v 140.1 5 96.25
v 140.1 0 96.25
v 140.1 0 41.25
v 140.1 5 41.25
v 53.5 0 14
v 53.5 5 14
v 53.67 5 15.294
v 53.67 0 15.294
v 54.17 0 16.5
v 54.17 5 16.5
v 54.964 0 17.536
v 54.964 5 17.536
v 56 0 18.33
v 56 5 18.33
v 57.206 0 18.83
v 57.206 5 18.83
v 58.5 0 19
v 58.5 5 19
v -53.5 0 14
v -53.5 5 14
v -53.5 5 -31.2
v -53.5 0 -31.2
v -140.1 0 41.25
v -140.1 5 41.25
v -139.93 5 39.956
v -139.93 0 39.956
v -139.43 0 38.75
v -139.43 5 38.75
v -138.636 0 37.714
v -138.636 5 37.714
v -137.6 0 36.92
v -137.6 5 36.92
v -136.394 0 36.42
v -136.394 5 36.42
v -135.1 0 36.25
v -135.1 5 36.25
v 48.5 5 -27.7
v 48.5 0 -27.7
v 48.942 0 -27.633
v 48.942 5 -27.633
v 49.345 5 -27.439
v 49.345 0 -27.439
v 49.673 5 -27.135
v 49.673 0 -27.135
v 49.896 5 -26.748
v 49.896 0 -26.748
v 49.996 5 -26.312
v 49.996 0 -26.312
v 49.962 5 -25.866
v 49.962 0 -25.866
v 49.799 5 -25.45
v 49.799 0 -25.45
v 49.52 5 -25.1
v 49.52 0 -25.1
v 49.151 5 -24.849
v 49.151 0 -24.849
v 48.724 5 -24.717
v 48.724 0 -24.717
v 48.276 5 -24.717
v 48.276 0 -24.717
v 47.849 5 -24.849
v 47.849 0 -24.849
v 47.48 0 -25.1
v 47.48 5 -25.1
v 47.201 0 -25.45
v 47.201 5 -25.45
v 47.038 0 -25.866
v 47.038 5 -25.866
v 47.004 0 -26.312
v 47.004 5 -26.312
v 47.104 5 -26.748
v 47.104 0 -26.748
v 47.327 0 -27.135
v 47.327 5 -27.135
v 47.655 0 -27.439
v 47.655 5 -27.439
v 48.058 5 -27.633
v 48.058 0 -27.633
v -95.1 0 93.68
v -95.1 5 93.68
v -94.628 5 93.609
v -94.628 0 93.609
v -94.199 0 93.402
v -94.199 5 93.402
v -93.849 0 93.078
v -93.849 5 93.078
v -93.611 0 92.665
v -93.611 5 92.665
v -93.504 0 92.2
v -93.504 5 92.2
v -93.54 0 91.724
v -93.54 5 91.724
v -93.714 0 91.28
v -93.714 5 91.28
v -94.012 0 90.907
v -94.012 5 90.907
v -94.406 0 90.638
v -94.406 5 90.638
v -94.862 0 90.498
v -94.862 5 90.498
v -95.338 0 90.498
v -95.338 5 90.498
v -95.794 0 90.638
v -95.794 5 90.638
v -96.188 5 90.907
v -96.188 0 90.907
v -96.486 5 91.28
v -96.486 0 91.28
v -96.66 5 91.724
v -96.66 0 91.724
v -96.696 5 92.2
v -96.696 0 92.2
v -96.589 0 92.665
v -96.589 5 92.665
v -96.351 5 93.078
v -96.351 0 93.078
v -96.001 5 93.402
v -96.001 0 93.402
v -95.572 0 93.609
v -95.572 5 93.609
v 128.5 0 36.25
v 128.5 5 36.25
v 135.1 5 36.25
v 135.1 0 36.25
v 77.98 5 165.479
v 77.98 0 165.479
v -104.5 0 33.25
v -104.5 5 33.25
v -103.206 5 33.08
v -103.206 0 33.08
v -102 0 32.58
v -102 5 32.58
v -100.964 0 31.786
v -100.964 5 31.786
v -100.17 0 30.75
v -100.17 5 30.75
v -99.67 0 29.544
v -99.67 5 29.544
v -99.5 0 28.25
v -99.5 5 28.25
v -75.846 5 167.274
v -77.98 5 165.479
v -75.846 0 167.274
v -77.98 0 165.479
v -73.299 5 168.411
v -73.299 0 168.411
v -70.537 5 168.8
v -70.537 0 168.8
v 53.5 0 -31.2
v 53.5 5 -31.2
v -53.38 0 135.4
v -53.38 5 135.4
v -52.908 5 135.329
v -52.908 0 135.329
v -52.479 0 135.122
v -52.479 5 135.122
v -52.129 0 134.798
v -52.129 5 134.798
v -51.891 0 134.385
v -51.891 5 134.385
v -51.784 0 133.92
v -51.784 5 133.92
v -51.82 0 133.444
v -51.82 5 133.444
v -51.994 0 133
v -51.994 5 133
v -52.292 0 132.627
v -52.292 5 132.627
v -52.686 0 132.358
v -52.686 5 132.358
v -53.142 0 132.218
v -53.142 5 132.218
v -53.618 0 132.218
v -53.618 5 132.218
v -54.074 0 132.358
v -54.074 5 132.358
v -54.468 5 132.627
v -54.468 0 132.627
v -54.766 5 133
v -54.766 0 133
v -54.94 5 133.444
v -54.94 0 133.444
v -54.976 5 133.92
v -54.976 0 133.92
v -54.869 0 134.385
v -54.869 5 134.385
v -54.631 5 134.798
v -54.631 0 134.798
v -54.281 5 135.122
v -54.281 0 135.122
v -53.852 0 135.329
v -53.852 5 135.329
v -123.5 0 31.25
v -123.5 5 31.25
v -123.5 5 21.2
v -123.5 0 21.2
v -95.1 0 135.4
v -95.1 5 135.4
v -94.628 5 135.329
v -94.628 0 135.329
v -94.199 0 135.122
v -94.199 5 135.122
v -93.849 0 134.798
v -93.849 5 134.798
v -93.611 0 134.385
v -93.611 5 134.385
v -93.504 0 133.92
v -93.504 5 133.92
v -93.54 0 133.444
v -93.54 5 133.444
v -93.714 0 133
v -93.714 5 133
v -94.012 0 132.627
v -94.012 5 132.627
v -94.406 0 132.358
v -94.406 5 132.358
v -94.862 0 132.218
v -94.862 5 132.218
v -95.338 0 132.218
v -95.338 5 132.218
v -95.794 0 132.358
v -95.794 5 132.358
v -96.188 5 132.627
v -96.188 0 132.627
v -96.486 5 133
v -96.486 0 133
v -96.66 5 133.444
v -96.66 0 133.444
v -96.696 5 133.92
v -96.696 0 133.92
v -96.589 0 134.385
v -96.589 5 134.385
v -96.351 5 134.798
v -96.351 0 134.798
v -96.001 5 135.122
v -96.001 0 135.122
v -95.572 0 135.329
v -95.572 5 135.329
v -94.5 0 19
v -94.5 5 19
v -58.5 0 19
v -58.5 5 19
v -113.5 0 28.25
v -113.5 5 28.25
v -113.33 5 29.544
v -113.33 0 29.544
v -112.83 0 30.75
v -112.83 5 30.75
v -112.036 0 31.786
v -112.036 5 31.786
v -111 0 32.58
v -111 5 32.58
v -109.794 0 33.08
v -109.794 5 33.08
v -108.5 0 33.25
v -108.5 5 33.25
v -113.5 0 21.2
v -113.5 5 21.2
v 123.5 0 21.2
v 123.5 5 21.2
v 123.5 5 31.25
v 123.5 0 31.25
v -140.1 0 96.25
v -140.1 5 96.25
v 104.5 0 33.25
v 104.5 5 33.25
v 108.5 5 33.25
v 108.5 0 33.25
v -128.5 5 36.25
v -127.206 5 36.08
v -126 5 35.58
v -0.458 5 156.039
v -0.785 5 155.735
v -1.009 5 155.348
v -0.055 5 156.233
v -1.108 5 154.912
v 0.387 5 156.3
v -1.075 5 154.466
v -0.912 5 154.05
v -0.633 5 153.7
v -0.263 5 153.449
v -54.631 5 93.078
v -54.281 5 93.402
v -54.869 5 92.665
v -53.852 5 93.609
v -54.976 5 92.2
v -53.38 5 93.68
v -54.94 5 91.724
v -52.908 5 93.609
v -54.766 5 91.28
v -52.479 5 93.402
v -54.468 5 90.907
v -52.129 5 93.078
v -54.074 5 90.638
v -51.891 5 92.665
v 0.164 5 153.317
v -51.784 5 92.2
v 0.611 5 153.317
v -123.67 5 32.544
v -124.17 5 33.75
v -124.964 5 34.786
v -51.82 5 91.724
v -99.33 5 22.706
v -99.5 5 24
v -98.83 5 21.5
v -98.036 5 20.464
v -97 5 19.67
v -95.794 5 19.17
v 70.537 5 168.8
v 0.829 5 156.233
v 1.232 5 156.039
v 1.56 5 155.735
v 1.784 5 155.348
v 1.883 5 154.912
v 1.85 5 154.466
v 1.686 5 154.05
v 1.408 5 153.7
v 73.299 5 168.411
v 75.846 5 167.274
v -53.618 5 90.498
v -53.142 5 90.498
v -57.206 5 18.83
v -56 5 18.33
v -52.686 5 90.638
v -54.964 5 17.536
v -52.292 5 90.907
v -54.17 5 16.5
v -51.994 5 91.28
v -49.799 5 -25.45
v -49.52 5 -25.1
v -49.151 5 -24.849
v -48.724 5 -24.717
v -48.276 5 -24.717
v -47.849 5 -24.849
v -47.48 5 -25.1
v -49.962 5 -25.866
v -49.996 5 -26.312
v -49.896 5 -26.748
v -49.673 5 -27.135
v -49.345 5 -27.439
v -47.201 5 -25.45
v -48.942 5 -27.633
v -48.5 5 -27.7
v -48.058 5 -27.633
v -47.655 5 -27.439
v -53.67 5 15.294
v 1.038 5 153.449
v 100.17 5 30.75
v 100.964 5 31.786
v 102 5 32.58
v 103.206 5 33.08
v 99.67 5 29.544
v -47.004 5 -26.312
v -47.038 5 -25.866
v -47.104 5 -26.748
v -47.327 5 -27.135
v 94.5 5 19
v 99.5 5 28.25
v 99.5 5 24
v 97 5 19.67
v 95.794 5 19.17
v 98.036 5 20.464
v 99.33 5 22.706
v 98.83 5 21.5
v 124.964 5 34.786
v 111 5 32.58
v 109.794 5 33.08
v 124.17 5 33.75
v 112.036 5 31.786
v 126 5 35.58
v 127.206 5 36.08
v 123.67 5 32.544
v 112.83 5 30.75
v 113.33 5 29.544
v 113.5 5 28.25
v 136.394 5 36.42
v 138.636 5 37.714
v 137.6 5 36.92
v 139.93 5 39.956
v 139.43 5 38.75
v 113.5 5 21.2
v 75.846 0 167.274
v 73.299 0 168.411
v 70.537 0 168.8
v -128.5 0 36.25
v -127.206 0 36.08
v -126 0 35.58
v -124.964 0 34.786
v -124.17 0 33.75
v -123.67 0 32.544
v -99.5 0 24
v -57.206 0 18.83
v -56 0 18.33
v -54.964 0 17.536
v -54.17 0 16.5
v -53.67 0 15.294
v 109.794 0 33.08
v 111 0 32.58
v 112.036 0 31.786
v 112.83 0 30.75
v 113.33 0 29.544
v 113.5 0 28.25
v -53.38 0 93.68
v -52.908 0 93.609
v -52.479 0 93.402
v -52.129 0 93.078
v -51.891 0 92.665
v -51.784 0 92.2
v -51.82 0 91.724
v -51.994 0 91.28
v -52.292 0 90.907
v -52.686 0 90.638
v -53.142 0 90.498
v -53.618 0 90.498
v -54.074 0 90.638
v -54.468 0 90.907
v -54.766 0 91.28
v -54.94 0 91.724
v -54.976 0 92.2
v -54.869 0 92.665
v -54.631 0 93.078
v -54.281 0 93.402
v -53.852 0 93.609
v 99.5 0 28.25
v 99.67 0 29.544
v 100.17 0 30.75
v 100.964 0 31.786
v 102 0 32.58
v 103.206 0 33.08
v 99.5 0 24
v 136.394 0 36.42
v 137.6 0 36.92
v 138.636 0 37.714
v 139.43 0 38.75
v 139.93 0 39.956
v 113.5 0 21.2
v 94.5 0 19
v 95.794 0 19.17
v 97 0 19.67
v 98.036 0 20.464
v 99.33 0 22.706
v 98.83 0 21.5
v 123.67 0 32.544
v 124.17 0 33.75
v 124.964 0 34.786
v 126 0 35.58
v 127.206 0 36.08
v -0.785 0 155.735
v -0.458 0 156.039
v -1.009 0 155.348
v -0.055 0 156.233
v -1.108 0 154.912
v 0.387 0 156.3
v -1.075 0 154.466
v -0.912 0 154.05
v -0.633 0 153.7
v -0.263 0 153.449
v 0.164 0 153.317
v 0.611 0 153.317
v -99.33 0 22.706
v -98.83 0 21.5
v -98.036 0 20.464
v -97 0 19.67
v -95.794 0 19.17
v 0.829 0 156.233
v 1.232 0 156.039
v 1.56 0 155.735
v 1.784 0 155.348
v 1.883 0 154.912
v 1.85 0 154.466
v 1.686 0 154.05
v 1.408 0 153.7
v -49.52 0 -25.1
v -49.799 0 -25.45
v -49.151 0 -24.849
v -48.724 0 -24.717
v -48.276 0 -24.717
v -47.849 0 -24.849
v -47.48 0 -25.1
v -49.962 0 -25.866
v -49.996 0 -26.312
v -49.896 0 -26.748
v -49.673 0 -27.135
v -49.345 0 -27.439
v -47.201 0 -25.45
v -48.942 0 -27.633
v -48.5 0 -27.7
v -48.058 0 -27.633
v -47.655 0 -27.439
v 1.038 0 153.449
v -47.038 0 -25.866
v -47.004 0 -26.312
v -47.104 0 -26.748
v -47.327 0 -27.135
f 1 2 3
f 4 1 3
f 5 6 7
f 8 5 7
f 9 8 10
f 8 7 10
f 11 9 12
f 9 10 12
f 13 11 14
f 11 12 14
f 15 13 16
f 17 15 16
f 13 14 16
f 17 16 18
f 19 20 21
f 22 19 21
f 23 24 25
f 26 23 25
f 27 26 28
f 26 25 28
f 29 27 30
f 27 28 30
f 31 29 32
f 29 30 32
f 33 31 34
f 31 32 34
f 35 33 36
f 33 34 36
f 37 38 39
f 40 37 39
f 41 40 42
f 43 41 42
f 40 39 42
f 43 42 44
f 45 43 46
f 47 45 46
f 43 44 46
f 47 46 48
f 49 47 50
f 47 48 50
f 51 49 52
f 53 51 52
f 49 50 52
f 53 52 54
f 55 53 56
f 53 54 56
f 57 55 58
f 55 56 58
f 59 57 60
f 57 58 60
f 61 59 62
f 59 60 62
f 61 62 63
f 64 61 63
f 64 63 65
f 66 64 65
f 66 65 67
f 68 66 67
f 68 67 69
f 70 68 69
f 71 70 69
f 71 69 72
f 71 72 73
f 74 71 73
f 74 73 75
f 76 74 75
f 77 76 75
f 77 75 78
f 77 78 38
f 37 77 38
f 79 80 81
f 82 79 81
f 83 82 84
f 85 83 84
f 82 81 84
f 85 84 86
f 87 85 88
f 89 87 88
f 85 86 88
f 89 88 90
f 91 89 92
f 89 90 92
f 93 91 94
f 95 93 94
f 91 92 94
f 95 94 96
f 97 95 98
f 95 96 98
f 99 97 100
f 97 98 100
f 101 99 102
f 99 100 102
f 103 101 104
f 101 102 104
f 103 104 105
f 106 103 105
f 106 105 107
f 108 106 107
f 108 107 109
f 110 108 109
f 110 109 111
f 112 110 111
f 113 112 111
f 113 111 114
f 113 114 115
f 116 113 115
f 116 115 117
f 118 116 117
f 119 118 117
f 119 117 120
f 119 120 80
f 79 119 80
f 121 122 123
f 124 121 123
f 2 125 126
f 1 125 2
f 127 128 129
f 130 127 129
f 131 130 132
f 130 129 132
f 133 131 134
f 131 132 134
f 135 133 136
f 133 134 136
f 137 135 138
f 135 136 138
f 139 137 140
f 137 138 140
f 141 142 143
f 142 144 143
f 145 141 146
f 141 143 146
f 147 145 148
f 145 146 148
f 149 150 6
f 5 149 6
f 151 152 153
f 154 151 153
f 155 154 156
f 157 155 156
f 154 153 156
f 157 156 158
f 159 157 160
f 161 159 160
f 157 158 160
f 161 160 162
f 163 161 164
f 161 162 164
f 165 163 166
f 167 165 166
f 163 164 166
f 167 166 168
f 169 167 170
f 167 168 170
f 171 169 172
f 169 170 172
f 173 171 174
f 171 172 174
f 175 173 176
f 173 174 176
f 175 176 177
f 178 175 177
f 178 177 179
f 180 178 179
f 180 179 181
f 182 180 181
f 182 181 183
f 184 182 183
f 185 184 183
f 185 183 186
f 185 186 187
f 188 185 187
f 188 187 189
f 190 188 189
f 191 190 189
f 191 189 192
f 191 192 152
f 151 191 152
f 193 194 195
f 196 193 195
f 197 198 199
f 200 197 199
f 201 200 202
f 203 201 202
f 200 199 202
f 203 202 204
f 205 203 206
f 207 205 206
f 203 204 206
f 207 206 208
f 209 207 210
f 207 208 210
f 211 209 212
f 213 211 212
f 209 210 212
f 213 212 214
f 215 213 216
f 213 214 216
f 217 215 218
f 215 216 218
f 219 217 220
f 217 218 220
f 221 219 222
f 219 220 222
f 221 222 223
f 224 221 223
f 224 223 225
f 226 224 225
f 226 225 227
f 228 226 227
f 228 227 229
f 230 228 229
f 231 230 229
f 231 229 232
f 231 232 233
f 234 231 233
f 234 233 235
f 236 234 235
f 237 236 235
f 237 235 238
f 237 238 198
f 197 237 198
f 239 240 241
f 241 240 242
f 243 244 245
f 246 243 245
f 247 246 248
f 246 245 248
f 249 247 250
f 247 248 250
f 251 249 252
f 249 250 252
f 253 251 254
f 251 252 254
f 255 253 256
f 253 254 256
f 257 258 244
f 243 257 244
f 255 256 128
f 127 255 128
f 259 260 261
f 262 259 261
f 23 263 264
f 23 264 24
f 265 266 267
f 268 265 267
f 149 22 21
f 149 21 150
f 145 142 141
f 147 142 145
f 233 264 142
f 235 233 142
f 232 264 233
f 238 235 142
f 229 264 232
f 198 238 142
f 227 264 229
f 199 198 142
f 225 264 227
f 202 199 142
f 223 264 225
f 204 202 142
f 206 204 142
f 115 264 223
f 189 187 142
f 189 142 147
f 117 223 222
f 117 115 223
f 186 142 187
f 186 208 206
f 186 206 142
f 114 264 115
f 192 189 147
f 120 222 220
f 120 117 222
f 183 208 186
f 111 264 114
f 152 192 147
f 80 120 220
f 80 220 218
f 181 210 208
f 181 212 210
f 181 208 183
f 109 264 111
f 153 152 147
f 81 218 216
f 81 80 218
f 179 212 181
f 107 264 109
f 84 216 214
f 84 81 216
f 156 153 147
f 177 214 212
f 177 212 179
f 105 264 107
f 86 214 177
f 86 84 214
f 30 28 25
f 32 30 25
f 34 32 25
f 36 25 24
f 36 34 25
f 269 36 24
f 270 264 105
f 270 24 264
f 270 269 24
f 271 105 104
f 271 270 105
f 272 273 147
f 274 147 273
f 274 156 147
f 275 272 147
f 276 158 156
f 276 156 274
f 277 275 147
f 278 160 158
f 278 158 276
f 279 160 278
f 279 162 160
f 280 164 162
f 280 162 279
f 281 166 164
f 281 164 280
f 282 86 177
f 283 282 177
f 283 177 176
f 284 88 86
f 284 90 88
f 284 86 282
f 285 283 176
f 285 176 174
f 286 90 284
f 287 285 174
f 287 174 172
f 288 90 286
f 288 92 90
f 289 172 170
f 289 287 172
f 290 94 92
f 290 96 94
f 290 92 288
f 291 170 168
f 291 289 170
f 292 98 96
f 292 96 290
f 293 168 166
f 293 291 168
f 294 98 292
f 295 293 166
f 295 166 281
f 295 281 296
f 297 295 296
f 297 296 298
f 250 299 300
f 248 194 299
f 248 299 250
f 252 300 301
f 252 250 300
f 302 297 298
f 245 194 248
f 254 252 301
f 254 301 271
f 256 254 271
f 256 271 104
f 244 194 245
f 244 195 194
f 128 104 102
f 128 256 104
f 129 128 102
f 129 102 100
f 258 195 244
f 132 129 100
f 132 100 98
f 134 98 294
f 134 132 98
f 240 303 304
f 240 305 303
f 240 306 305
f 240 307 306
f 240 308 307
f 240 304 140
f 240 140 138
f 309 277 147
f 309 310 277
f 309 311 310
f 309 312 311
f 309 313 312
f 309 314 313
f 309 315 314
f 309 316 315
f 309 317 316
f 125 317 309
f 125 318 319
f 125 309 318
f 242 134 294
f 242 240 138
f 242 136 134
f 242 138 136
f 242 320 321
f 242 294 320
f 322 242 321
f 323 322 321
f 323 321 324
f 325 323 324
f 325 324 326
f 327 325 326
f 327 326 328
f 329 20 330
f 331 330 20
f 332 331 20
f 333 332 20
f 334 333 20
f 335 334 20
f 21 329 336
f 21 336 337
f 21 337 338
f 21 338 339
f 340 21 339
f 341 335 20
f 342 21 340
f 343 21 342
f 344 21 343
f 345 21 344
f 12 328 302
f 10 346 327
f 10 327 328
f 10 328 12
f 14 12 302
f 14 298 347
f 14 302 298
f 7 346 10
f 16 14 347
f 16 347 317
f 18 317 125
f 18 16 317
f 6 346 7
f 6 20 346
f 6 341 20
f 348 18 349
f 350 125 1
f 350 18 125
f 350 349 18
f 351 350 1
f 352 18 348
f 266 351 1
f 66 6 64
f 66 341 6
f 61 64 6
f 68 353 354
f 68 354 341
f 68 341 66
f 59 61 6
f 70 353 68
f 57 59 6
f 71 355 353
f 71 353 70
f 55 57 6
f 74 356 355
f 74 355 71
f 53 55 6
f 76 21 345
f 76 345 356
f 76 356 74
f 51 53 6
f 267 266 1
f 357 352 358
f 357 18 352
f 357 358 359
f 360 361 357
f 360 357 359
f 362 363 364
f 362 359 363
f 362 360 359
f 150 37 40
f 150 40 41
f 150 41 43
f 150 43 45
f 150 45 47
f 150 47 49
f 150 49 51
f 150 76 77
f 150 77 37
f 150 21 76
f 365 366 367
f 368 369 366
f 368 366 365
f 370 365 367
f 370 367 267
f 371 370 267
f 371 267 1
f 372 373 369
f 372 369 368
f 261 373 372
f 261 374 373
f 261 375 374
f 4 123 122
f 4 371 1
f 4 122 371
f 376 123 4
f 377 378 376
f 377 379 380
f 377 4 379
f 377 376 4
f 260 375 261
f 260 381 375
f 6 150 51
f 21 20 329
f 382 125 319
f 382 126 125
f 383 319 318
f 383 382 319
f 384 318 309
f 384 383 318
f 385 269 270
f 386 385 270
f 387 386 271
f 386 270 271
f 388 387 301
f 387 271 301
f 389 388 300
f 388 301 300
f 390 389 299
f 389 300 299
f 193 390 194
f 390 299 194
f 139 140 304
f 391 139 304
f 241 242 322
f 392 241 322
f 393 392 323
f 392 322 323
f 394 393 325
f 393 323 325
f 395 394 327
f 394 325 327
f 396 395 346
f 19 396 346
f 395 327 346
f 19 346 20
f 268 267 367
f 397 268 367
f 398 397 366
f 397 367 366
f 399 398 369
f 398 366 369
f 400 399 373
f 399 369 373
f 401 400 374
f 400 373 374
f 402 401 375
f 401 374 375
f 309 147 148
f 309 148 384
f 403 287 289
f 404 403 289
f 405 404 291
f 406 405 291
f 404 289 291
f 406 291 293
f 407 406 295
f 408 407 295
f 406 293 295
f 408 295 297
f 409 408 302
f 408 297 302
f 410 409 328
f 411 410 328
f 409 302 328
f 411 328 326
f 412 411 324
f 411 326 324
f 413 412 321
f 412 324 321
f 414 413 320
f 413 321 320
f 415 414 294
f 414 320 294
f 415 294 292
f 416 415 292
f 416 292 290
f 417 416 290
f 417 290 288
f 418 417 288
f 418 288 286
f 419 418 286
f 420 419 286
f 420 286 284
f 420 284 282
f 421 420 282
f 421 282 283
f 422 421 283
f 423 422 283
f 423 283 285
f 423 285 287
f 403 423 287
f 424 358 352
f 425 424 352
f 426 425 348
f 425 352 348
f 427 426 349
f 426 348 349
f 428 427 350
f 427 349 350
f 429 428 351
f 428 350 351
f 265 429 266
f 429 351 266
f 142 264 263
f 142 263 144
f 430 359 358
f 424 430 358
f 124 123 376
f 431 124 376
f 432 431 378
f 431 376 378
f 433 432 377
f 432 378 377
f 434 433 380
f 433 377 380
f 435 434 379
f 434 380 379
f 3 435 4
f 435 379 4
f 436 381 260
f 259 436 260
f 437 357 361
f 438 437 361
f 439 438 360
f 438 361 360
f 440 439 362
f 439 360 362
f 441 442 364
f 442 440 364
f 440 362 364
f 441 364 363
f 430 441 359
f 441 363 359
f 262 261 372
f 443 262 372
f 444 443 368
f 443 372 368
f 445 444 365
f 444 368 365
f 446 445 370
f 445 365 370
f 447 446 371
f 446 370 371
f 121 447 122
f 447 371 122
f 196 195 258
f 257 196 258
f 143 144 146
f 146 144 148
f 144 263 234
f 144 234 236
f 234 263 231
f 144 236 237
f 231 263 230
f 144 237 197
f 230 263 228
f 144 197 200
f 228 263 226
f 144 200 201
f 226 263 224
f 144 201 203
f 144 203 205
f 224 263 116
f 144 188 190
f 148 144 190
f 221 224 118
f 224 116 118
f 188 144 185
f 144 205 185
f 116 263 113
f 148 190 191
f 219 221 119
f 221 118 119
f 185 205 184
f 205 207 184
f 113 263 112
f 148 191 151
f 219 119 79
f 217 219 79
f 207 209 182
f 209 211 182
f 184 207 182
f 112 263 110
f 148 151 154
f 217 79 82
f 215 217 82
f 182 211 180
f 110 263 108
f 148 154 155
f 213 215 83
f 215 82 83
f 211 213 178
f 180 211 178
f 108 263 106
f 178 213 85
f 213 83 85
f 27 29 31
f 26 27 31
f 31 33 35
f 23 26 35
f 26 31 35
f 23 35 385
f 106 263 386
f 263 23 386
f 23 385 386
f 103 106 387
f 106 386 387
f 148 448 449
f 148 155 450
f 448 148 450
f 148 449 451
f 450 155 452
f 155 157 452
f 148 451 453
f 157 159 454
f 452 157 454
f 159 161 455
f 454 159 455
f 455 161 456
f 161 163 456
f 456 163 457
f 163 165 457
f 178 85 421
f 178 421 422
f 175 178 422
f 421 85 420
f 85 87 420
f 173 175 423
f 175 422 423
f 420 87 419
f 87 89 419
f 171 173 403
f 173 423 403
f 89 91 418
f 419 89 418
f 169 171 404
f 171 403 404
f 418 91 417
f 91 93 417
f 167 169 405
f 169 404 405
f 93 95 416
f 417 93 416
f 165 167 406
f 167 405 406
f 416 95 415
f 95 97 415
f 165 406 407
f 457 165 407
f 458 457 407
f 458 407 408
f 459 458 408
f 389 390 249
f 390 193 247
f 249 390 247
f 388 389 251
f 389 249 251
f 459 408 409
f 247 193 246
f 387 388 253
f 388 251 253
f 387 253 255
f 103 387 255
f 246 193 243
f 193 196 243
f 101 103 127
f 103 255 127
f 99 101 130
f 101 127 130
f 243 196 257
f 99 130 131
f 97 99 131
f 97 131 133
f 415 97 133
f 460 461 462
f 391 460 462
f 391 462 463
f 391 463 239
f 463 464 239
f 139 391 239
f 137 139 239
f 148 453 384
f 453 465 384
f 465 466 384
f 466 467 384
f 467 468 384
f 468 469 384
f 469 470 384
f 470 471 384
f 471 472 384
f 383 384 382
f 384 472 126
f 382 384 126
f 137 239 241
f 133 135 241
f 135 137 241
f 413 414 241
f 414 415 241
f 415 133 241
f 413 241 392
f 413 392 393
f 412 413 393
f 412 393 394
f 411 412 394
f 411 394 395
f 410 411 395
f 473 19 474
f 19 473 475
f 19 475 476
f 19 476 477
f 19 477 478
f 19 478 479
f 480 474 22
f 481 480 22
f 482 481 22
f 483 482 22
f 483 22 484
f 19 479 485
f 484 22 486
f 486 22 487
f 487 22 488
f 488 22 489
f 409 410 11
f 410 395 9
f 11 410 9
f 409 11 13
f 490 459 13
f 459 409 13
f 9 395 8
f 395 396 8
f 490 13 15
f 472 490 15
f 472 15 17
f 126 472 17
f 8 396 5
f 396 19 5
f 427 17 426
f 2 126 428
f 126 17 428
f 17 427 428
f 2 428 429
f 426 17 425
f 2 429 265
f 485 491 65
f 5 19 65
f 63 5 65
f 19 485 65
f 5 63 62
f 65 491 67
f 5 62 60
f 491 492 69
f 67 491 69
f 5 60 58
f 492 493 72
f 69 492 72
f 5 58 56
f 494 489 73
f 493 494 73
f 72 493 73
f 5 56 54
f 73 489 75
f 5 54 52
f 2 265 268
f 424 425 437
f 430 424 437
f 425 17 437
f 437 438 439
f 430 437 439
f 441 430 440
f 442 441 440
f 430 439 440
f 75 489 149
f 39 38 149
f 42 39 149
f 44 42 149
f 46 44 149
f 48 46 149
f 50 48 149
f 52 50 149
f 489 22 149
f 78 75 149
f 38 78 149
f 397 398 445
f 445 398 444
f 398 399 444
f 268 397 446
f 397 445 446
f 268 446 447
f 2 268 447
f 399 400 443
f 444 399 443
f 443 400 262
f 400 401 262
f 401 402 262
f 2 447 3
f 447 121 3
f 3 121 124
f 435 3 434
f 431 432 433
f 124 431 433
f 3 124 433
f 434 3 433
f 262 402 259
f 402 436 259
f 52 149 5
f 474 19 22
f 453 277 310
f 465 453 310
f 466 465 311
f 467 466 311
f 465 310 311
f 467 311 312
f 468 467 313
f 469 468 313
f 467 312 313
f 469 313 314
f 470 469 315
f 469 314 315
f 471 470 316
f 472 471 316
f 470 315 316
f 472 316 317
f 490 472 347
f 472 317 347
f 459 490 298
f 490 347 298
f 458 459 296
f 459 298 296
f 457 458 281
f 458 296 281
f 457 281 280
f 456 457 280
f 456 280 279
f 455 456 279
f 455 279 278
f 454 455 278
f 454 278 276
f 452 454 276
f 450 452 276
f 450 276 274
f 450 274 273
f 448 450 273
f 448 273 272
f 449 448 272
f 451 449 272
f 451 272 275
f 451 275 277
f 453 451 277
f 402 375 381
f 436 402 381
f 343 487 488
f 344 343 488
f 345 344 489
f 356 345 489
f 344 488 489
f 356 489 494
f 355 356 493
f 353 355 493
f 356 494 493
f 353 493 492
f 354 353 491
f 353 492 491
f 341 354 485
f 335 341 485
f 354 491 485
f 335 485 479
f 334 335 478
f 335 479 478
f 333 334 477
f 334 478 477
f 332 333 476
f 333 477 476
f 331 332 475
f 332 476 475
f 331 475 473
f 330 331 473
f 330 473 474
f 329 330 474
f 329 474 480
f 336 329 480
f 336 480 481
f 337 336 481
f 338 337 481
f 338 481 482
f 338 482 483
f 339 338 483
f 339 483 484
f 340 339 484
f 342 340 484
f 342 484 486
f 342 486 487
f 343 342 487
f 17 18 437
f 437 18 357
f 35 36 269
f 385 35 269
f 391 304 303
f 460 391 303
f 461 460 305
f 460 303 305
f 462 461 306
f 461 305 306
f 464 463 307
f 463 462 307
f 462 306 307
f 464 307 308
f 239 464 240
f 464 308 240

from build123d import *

# Parameters (mm, degrees)
ESQUISSE1_W              = 280.2
ESQUISSE1_H              = 276.282873123
BOSS_EXTRU_1_DEPTH       = 5
ENL_V_MAT_EXTRU_3_DEPTH  = 283.344868376
ENL_V_MAT_EXTRU_5_DEPTH  = 283.344868376
ESQUISSE8_R              = 1.5
ENL_V_MAT_EXTRU_8_DEPTH  = 283.344868376
ENL_V_MAT_EXTRU_15_DEPTH = 283.344868376
CONG_1_R                 = 10
ESQUISSE13_R             = 1.5
ENL_V_MAT_EXTRU_16_DEPTH = 220.422993326
ESQUISSE14_R             = 1.6
ENL_V_MAT_EXTRU_17_DEPTH = 220.422993326


with BuildPart() as part:
    # Esquisse1 → Boss.-Extru.1 (new body)
    with BuildSketch(Plane(origin=(0, 0, 0), x_dir=(1, 0, 0), z_dir=(0, 1, 0))):
        with Locations((0, -106.941436562)):
            Rectangle(ESQUISSE1_W, ESQUISSE1_H)
    extrude(amount=BOSS_EXTRU_1_DEPTH)

    # Esquisse4 → Enlèv. mat.-Extru.3 (cut, through all)
    with BuildSketch(Plane(origin=(0, 5, 0), x_dir=(1, 0, 0), z_dir=(0, 1, 0))):
        with BuildLine():
            Line((140.1, -245.082873123), (101.1, -245.082873123))
            ThreePointArc((101.1, -245.082873123), (128.677164466, -233.660037589), (140.1, -206.082873123))
            Line((140.1, -206.082873123), (140.1, -245.082873123))
        make_face()
        with BuildLine():
            Line((-101.1, -245.082873123), (-140.1, -245.082873123))
            Line((-140.1, -245.082873123), (-140.1, -206.082873123))
            ThreePointArc((-140.1, -206.082873123), (-128.677164466, -233.660037589), (-101.1, -245.082873123))
        make_face()
    extrude(amount=-ENL_V_MAT_EXTRU_3_DEPTH, mode=Mode.SUBTRACT)

    # Esquisse6 → Enlèv. mat.-Extru.5 (cut, through all)
    with BuildSketch(Plane(origin=(0, 5, 0), x_dir=(1, 0, 0), z_dir=(0, 1, 0))):
        with BuildLine():
            Line((140.1, 31.2), (53.5, 31.2))
            Line((53.5, 31.2), (53.5, -14))
            ThreePointArc((53.5, -14), (54.964466094, -17.535533906), (58.5, -19))
            Line((58.5, -19), (94.5, -19))
            ThreePointArc((94.5, -19), (98.035533906, -20.464466094), (99.5, -24))
            Line((99.5, -24), (99.5, -28.25))
            ThreePointArc((99.5, -28.25), (100.964466094, -31.785533906), (104.5, -33.25))
            Line((104.5, -33.25), (108.5, -33.25))
            ThreePointArc((108.5, -33.25), (112.035533906, -31.785533906), (113.5, -28.25))
            Line((113.5, -28.25), (113.5, -21.2))
            Line((113.5, -21.2), (123.5, -21.2))
            Line((123.5, -21.2), (123.5, -31.25))
            ThreePointArc((123.5, -31.25), (124.964466094, -34.785533906), (128.5, -36.25))
            Line((128.5, -36.25), (135.1, -36.25))
            ThreePointArc((135.1, -36.25), (138.635533906, -37.714466094), (140.1, -41.25))
            Line((140.1, -41.25), (140.1, 31.2))
        make_face()
        with BuildLine():
            Line((-53.5, -14), (-53.5, 31.2))
            Line((-53.5, 31.2), (-140.1, 31.2))
            Line((-140.1, 31.2), (-140.1, -41.25))
            ThreePointArc((-140.1, -41.25), (-138.635533906, -37.714466094), (-135.1, -36.25))
            Line((-135.1, -36.25), (-128.5, -36.25))
            ThreePointArc((-128.5, -36.25), (-124.964466094, -34.785533906), (-123.5, -31.25))
            Line((-123.5, -31.25), (-123.5, -21.2))
            Line((-123.5, -21.2), (-113.5, -21.2))
            Line((-113.5, -21.2), (-113.5, -28.25))
            ThreePointArc((-113.5, -28.25), (-112.035533906, -31.785533906), (-108.5, -33.25))
            Line((-108.5, -33.25), (-104.5, -33.25))
            ThreePointArc((-104.5, -33.25), (-100.964466094, -31.785533906), (-99.5, -28.25))
            Line((-99.5, -28.25), (-99.5, -24))
            ThreePointArc((-99.5, -24), (-98.035533906, -20.464466094), (-94.5, -19))
            Line((-94.5, -19), (-58.5, -19))
            ThreePointArc((-58.5, -19), (-54.964466094, -17.535533906), (-53.5, -14))
        make_face()
    extrude(amount=-ENL_V_MAT_EXTRU_5_DEPTH, mode=Mode.SUBTRACT)

    # Esquisse8 → Enlèv. mat.-Extru.8 (cut, through all)
    with BuildSketch(Plane.XZ):
        with Locations(Location((-48.5, -26.2, 0), (0, 0, 270))):
            Circle(ESQUISSE8_R)
        with Locations(Location((48.5, -26.2, 0), (0, 0, 270))):
            Circle(ESQUISSE8_R)
    extrude(amount=-ENL_V_MAT_EXTRU_8_DEPTH, mode=Mode.SUBTRACT)

    # Esquisse12 → Enlèv. mat.-Extru.15 (cut, through all)
    with BuildSketch(Plane(origin=(0, 5, 0), x_dir=(1, 0, 0), z_dir=(0, 1, 0))):
        Polygon((-140.1, -96.25), (-75, -168.8), (75, -168.8), (140.1, -96.25), (146.03275504, -294.983631094), (-140.1, -294.983631094), align=None)
    extrude(amount=-ENL_V_MAT_EXTRU_15_DEPTH, mode=Mode.SUBTRACT)

    # Congé1
    cong_1_edges = [part.edges().sort_by_distance(p)[0] for p in [
        (-75, 2.5, 168.8),
        (75, 2.5, 168.8),
    ]]
    fillet(cong_1_edges, radius=CONG_1_R)

    # Esquisse13 → Enlèv. mat.-Extru.16 (cut, through all)
    with BuildSketch(Plane(origin=(0, 5, 0), x_dir=(1, 0, 0), z_dir=(0, 1, 0))):
        with Locations(Location((0.38736006, -154.8, 0), (0, 0, 270))):
            Circle(ESQUISSE13_R)
    extrude(amount=-ENL_V_MAT_EXTRU_16_DEPTH, mode=Mode.SUBTRACT)

    # Esquisse14 → Enlèv. mat.-Extru.17 (cut, through all)
    with BuildSketch(Plane(origin=(0, 5, 0), x_dir=(1, 0, 0), z_dir=(0, 1, 0))):
        with Locations(Location((-95.1, -133.8, 0), (0, 0, 270))):
            Circle(ESQUISSE14_R)
        with Locations(Location((-53.38, -133.8, 0), (0, 0, 270))):
            Circle(ESQUISSE14_R)
        with Locations(Location((-95.1, -92.08, 0), (0, 0, 270))):
            Circle(ESQUISSE14_R)
        with Locations(Location((-53.38, -92.08, 0), (0, 0, 270))):
            Circle(ESQUISSE14_R)
    extrude(amount=-ENL_V_MAT_EXTRU_17_DEPTH, mode=Mode.SUBTRACT)


solid = part.part
